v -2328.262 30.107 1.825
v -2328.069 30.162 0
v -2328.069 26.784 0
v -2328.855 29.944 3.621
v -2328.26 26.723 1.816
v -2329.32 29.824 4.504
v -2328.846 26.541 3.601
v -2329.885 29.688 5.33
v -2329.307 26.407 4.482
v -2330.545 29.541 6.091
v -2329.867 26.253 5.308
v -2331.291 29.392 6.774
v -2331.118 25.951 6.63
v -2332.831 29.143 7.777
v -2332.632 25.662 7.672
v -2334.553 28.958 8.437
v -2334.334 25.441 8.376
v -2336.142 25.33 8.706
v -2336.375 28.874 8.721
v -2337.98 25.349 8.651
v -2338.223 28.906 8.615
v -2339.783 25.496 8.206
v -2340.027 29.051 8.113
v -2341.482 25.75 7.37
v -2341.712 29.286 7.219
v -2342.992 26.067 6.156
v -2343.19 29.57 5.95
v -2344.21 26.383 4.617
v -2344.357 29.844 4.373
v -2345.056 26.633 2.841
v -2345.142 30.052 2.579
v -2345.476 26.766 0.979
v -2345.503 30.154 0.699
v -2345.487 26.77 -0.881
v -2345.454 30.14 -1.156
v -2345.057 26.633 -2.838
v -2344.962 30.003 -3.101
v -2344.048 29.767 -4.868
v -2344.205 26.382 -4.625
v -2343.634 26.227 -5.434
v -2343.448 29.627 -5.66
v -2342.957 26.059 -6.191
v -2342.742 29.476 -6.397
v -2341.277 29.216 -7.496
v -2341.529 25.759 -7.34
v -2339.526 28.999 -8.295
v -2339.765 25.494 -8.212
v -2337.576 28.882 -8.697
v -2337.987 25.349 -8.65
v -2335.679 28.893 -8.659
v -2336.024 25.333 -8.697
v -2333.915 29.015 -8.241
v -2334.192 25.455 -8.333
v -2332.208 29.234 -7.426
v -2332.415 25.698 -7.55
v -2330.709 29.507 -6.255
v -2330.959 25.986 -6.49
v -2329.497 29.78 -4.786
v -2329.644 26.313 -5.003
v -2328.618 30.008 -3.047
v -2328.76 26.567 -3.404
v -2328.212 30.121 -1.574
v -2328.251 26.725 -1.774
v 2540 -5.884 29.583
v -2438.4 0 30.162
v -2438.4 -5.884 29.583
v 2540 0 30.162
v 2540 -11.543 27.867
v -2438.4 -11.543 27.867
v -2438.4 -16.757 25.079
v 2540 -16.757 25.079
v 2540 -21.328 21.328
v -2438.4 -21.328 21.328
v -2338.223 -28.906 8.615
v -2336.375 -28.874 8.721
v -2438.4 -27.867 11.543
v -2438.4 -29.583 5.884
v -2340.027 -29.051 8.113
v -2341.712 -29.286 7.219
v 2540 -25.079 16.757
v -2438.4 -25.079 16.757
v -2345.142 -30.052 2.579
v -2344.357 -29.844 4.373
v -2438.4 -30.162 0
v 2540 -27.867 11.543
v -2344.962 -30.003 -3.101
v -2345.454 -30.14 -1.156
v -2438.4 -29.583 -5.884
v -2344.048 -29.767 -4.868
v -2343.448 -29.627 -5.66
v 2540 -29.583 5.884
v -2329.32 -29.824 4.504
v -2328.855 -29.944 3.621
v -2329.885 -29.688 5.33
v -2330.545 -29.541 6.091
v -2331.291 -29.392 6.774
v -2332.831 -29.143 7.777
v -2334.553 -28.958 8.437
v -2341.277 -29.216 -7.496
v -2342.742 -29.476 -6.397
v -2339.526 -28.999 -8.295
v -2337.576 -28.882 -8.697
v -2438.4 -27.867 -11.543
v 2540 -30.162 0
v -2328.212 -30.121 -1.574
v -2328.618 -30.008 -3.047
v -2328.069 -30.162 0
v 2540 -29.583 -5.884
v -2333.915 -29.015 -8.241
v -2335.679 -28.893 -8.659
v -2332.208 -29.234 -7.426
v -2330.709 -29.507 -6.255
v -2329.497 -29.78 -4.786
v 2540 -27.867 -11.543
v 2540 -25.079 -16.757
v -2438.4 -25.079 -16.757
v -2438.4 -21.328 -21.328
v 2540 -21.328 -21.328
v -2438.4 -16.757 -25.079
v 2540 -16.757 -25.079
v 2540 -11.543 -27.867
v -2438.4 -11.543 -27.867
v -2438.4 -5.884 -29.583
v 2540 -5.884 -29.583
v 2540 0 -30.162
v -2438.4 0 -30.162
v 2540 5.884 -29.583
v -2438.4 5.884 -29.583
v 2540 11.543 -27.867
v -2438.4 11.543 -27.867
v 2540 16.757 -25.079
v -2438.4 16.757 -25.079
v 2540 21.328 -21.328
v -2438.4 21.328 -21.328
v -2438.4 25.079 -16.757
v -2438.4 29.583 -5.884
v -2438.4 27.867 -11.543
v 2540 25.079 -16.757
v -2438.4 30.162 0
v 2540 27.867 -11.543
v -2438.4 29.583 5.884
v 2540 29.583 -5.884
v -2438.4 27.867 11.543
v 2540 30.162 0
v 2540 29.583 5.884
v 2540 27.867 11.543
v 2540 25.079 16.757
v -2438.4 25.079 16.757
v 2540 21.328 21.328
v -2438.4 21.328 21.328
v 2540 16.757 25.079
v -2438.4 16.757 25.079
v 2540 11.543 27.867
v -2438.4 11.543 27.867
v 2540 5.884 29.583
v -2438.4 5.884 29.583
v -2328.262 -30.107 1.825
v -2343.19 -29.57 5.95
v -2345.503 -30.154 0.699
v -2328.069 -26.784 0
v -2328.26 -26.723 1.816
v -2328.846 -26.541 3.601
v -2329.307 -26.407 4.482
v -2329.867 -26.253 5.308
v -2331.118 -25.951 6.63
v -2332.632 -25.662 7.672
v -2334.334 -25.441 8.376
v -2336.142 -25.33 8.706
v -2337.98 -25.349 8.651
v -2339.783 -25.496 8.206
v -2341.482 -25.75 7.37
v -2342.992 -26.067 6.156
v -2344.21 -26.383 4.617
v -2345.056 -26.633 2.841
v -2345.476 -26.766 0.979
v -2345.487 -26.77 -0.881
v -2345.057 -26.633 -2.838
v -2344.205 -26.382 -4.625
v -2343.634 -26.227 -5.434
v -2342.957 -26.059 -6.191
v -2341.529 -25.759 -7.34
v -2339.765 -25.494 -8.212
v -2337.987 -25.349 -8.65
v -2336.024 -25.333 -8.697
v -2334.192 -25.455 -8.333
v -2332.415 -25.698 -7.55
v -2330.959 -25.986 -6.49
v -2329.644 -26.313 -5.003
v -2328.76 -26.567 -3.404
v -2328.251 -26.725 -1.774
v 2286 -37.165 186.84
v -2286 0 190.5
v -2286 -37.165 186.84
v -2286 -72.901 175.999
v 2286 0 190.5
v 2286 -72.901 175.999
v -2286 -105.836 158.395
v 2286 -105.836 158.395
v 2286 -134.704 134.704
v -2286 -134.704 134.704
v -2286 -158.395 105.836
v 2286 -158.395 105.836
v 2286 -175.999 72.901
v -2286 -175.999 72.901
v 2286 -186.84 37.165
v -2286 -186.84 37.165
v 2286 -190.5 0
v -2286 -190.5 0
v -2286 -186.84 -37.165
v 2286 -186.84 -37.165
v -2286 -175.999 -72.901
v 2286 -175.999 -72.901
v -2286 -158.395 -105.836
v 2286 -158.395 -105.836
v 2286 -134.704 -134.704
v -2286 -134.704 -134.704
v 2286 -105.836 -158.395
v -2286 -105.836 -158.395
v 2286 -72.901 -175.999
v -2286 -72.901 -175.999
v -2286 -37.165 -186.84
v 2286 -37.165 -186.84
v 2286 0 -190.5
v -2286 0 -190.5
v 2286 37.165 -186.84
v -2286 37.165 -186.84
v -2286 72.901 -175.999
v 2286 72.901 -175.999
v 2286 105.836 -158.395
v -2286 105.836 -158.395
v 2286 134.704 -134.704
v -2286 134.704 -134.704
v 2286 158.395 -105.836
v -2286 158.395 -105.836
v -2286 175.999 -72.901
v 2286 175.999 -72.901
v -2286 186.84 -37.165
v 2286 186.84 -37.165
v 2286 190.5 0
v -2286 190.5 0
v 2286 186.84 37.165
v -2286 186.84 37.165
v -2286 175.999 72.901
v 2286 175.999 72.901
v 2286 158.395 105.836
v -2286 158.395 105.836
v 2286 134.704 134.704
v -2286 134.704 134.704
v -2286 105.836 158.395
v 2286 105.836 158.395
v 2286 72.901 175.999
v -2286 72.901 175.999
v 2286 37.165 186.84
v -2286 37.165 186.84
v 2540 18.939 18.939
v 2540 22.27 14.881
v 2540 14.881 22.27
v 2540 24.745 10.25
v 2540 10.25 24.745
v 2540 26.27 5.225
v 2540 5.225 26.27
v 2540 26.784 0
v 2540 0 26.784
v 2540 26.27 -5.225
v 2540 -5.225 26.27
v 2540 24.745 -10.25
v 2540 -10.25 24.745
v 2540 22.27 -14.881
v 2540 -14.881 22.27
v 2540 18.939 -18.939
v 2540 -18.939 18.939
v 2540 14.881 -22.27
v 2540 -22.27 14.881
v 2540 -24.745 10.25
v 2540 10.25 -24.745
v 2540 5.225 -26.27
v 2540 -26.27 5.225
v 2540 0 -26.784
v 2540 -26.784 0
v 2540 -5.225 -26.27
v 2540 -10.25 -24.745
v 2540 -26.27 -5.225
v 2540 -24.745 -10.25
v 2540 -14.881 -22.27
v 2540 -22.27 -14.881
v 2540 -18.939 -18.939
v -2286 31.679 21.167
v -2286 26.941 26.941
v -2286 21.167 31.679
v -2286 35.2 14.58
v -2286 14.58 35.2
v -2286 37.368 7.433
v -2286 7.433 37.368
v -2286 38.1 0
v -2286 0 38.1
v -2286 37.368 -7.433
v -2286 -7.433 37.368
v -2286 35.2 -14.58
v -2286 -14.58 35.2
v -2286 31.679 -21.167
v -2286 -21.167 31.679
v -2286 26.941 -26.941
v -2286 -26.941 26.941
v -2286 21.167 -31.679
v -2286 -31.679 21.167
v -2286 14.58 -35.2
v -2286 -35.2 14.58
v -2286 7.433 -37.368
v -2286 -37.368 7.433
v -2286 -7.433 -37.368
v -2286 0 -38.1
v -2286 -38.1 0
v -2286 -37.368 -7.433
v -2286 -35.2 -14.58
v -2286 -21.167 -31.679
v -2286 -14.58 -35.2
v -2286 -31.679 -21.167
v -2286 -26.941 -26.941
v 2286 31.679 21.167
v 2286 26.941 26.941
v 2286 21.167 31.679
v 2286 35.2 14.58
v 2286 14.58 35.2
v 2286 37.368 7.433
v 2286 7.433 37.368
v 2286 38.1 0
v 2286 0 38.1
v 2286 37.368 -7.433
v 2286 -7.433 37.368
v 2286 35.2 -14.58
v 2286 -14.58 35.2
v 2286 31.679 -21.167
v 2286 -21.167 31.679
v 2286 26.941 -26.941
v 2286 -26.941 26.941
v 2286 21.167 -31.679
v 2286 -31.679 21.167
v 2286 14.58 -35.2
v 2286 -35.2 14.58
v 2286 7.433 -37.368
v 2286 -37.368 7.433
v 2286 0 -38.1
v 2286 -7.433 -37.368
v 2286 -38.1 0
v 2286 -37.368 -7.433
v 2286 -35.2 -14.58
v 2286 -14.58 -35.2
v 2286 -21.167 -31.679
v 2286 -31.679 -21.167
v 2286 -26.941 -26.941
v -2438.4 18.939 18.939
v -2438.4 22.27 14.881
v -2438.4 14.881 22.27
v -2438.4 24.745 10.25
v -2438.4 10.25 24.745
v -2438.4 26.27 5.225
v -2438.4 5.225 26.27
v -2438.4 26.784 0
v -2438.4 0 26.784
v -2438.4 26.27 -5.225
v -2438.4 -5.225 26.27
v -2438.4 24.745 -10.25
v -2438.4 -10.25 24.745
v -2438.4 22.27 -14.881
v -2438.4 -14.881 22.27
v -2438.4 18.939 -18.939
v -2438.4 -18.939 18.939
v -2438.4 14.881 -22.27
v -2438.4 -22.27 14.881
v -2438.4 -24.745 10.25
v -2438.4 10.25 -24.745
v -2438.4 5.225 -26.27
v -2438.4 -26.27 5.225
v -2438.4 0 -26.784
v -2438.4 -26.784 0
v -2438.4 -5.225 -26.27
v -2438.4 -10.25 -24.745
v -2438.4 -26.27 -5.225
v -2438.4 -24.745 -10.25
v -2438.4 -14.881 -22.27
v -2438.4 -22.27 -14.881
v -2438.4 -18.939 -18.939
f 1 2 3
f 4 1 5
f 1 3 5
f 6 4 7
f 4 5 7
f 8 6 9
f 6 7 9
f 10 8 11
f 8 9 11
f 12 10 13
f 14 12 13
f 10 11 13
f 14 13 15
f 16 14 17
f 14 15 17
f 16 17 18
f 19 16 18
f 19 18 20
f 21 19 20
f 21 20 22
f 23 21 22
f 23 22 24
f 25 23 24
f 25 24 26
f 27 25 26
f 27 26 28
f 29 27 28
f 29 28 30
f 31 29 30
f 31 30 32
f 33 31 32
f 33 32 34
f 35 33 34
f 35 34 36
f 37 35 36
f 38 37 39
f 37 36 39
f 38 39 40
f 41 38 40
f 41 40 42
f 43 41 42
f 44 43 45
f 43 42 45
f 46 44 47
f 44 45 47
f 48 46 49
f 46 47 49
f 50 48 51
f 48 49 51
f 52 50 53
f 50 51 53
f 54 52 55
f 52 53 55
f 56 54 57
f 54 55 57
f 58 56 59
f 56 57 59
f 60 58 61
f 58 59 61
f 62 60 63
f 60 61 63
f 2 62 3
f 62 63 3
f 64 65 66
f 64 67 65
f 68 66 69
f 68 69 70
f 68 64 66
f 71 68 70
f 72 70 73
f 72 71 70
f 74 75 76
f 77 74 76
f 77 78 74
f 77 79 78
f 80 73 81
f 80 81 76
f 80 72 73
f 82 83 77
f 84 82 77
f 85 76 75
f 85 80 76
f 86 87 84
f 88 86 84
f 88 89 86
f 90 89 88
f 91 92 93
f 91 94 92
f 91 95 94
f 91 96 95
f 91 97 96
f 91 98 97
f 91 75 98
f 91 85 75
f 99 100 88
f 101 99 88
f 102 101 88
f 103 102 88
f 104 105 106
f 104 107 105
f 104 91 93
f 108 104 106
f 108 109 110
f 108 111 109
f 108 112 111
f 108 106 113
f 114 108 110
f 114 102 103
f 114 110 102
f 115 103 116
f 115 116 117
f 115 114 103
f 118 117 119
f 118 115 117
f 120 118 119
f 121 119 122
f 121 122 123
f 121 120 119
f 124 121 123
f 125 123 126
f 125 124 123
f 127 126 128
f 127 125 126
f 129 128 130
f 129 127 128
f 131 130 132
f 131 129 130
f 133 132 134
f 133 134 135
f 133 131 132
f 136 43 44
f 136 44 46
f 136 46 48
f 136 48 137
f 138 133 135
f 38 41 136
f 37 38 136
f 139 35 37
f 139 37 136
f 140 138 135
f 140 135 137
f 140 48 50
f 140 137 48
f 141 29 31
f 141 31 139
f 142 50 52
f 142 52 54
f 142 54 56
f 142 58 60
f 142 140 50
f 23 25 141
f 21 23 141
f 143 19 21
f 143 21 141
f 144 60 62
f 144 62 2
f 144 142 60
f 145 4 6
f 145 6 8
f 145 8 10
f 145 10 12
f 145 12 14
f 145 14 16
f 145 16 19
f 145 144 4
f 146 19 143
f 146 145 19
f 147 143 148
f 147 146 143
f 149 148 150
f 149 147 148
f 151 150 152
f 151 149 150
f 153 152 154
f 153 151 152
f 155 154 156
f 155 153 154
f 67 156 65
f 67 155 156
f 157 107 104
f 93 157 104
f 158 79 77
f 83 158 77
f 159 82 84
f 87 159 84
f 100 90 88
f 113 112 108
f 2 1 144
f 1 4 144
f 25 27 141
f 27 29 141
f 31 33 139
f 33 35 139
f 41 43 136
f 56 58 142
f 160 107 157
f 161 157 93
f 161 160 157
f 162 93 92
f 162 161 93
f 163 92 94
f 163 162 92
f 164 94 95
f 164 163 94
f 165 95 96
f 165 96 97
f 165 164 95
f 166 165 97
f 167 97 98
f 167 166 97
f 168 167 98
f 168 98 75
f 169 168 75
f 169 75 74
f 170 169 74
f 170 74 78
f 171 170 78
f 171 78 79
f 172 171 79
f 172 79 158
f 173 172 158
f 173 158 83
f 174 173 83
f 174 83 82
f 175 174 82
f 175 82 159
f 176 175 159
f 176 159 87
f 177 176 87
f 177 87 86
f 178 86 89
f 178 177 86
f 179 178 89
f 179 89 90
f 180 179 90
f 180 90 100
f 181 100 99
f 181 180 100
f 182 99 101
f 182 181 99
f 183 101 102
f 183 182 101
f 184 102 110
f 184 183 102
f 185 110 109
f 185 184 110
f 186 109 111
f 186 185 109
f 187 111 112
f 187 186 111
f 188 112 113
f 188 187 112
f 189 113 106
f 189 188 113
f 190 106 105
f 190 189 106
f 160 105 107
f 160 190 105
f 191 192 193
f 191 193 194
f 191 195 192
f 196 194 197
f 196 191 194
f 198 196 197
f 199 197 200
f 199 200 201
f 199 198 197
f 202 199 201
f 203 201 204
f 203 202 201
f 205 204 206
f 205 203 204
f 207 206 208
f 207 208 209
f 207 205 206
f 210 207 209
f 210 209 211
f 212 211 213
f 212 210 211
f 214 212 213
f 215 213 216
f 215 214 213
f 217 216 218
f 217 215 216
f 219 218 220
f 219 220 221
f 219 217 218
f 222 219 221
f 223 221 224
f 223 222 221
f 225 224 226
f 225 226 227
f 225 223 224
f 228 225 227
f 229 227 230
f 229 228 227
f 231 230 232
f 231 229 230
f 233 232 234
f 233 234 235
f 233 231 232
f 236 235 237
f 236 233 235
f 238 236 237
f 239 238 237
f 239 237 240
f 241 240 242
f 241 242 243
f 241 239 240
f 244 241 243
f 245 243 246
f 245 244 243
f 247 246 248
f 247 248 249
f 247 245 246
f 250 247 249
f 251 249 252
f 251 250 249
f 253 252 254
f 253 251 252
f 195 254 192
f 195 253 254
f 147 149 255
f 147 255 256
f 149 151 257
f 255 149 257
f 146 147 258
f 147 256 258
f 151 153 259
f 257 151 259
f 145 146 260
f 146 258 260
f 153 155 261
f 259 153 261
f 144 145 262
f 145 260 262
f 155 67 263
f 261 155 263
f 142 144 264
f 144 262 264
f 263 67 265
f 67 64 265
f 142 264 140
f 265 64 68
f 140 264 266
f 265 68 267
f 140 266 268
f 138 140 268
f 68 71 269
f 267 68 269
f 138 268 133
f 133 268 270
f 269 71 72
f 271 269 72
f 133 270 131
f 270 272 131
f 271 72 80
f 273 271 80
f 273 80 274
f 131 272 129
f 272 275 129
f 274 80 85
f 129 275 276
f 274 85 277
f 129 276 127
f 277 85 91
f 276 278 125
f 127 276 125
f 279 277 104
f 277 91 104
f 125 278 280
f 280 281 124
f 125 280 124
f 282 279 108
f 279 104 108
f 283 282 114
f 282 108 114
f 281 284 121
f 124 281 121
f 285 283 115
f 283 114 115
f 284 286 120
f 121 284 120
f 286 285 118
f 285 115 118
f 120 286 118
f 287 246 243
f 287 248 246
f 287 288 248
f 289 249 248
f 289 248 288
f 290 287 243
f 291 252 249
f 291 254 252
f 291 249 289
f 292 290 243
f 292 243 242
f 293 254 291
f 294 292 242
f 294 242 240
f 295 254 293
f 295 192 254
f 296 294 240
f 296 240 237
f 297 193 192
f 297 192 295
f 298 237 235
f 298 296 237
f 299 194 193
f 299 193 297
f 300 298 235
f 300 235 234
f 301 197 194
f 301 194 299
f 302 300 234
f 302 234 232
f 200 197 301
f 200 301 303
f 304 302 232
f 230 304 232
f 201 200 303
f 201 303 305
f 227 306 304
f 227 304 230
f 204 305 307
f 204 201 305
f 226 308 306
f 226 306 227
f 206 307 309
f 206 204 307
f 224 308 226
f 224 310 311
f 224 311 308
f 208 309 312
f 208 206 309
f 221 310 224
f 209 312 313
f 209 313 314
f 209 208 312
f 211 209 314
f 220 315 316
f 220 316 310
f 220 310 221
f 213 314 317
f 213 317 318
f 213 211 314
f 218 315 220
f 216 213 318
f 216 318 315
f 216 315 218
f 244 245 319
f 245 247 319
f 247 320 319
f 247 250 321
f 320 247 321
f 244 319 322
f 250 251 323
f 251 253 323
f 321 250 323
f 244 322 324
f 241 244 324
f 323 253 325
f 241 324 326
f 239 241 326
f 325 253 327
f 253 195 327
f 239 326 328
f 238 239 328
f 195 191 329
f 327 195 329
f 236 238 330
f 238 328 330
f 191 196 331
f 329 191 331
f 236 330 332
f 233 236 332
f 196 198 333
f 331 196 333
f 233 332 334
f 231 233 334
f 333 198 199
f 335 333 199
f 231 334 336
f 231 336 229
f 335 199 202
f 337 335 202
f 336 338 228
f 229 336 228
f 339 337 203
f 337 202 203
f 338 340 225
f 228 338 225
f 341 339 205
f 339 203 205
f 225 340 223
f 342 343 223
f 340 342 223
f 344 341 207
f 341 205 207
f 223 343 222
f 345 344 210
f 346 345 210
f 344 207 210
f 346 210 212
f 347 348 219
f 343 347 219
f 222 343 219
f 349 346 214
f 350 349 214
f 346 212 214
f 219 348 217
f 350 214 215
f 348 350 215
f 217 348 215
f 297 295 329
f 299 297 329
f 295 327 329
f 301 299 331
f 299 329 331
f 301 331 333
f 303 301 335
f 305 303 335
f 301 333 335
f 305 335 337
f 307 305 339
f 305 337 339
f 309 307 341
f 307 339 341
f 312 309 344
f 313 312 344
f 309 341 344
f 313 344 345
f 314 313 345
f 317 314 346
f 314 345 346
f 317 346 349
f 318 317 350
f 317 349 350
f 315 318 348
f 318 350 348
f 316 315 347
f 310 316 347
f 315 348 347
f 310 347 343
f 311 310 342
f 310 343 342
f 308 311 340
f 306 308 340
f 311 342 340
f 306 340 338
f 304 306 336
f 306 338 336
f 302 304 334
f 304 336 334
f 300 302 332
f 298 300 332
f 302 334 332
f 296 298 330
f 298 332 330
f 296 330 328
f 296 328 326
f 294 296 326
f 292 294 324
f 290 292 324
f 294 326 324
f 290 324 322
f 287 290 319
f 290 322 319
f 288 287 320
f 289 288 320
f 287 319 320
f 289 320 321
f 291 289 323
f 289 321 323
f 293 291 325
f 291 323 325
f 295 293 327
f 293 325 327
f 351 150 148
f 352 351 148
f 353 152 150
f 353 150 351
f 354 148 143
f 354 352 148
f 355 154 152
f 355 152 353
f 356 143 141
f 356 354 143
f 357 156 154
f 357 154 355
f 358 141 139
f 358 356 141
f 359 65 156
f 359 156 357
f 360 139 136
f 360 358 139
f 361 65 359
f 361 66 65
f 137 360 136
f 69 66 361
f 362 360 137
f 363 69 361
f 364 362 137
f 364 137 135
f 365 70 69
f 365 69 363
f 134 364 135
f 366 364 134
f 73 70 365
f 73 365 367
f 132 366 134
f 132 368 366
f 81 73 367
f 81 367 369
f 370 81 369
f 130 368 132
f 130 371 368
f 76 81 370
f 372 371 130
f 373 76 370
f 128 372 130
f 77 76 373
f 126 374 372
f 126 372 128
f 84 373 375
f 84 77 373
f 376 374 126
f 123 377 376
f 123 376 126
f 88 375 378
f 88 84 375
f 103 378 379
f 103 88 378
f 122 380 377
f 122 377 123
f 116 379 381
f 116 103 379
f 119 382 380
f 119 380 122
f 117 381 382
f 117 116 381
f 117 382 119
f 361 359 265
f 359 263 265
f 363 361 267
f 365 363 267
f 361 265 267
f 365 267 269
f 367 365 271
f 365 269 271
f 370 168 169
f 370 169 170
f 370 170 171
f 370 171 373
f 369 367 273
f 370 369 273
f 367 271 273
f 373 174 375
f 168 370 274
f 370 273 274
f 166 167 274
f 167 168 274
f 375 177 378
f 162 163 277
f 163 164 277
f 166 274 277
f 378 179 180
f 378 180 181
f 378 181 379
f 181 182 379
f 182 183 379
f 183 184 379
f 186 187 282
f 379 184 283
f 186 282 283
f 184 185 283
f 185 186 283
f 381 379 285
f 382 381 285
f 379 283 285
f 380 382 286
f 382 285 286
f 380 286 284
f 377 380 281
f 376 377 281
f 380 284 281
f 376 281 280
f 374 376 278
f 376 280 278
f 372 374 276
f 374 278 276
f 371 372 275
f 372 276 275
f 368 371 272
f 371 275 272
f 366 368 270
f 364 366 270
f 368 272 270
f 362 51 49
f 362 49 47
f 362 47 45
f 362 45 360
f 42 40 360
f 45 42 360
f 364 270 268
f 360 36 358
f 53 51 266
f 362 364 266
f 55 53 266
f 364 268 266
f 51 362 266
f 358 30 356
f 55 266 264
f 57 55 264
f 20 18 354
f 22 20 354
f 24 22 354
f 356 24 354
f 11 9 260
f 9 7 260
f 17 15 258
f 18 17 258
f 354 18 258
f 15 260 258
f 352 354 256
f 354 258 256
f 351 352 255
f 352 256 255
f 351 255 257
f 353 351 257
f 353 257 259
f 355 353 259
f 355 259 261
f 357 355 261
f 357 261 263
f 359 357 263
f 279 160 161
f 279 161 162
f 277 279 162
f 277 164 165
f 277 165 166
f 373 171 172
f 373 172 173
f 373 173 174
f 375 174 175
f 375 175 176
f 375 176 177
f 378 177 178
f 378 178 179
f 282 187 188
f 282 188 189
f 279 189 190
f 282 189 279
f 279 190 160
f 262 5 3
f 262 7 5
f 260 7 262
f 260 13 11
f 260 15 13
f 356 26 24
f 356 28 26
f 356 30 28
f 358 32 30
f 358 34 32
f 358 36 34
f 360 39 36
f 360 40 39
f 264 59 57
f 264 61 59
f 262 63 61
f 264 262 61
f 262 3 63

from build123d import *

# Parameters (mm, degrees)
F0_W          = 4572
F0_H          = 152.4
F0_W_2        = 4978.4
F0_H_2        = 3.3782
F2_R          = 8.73125
F3_DEPTH      = 190.501
F3_DEPTH_BACK = 190.501


with BuildPart() as f1:
    # F0 (on Front) → F1 (revolve)
    with BuildSketch(Plane.XZ):
        with Locations((0, 114.3)):
            Rectangle(F0_W, F0_H)
    revolve(axis=Axis((0, 0, 0), (1, 0, 0)))


with BuildPart() as f1b:
    # F0 (on Front) → F1, piece 2 (revolve)
    with BuildSketch(Plane.XZ):
        with Locations((50.8, 28.4734)):
            Rectangle(F0_W_2, F0_H_2)
    revolve(axis=Axis((0, 0, 0), (1, 0, 0)))

    # F2 (on Front) → F3 (cut, two sides)
    with BuildSketch(Plane.XZ) as f3_sk:
        with Locations((-2336.8, 0)):
            Circle(F2_R)
    extrude(amount=-F3_DEPTH, mode=Mode.SUBTRACT)
    extrude(f3_sk.sketch, amount=F3_DEPTH_BACK, mode=Mode.SUBTRACT)


solid = Compound([f1.part, f1b.part])
